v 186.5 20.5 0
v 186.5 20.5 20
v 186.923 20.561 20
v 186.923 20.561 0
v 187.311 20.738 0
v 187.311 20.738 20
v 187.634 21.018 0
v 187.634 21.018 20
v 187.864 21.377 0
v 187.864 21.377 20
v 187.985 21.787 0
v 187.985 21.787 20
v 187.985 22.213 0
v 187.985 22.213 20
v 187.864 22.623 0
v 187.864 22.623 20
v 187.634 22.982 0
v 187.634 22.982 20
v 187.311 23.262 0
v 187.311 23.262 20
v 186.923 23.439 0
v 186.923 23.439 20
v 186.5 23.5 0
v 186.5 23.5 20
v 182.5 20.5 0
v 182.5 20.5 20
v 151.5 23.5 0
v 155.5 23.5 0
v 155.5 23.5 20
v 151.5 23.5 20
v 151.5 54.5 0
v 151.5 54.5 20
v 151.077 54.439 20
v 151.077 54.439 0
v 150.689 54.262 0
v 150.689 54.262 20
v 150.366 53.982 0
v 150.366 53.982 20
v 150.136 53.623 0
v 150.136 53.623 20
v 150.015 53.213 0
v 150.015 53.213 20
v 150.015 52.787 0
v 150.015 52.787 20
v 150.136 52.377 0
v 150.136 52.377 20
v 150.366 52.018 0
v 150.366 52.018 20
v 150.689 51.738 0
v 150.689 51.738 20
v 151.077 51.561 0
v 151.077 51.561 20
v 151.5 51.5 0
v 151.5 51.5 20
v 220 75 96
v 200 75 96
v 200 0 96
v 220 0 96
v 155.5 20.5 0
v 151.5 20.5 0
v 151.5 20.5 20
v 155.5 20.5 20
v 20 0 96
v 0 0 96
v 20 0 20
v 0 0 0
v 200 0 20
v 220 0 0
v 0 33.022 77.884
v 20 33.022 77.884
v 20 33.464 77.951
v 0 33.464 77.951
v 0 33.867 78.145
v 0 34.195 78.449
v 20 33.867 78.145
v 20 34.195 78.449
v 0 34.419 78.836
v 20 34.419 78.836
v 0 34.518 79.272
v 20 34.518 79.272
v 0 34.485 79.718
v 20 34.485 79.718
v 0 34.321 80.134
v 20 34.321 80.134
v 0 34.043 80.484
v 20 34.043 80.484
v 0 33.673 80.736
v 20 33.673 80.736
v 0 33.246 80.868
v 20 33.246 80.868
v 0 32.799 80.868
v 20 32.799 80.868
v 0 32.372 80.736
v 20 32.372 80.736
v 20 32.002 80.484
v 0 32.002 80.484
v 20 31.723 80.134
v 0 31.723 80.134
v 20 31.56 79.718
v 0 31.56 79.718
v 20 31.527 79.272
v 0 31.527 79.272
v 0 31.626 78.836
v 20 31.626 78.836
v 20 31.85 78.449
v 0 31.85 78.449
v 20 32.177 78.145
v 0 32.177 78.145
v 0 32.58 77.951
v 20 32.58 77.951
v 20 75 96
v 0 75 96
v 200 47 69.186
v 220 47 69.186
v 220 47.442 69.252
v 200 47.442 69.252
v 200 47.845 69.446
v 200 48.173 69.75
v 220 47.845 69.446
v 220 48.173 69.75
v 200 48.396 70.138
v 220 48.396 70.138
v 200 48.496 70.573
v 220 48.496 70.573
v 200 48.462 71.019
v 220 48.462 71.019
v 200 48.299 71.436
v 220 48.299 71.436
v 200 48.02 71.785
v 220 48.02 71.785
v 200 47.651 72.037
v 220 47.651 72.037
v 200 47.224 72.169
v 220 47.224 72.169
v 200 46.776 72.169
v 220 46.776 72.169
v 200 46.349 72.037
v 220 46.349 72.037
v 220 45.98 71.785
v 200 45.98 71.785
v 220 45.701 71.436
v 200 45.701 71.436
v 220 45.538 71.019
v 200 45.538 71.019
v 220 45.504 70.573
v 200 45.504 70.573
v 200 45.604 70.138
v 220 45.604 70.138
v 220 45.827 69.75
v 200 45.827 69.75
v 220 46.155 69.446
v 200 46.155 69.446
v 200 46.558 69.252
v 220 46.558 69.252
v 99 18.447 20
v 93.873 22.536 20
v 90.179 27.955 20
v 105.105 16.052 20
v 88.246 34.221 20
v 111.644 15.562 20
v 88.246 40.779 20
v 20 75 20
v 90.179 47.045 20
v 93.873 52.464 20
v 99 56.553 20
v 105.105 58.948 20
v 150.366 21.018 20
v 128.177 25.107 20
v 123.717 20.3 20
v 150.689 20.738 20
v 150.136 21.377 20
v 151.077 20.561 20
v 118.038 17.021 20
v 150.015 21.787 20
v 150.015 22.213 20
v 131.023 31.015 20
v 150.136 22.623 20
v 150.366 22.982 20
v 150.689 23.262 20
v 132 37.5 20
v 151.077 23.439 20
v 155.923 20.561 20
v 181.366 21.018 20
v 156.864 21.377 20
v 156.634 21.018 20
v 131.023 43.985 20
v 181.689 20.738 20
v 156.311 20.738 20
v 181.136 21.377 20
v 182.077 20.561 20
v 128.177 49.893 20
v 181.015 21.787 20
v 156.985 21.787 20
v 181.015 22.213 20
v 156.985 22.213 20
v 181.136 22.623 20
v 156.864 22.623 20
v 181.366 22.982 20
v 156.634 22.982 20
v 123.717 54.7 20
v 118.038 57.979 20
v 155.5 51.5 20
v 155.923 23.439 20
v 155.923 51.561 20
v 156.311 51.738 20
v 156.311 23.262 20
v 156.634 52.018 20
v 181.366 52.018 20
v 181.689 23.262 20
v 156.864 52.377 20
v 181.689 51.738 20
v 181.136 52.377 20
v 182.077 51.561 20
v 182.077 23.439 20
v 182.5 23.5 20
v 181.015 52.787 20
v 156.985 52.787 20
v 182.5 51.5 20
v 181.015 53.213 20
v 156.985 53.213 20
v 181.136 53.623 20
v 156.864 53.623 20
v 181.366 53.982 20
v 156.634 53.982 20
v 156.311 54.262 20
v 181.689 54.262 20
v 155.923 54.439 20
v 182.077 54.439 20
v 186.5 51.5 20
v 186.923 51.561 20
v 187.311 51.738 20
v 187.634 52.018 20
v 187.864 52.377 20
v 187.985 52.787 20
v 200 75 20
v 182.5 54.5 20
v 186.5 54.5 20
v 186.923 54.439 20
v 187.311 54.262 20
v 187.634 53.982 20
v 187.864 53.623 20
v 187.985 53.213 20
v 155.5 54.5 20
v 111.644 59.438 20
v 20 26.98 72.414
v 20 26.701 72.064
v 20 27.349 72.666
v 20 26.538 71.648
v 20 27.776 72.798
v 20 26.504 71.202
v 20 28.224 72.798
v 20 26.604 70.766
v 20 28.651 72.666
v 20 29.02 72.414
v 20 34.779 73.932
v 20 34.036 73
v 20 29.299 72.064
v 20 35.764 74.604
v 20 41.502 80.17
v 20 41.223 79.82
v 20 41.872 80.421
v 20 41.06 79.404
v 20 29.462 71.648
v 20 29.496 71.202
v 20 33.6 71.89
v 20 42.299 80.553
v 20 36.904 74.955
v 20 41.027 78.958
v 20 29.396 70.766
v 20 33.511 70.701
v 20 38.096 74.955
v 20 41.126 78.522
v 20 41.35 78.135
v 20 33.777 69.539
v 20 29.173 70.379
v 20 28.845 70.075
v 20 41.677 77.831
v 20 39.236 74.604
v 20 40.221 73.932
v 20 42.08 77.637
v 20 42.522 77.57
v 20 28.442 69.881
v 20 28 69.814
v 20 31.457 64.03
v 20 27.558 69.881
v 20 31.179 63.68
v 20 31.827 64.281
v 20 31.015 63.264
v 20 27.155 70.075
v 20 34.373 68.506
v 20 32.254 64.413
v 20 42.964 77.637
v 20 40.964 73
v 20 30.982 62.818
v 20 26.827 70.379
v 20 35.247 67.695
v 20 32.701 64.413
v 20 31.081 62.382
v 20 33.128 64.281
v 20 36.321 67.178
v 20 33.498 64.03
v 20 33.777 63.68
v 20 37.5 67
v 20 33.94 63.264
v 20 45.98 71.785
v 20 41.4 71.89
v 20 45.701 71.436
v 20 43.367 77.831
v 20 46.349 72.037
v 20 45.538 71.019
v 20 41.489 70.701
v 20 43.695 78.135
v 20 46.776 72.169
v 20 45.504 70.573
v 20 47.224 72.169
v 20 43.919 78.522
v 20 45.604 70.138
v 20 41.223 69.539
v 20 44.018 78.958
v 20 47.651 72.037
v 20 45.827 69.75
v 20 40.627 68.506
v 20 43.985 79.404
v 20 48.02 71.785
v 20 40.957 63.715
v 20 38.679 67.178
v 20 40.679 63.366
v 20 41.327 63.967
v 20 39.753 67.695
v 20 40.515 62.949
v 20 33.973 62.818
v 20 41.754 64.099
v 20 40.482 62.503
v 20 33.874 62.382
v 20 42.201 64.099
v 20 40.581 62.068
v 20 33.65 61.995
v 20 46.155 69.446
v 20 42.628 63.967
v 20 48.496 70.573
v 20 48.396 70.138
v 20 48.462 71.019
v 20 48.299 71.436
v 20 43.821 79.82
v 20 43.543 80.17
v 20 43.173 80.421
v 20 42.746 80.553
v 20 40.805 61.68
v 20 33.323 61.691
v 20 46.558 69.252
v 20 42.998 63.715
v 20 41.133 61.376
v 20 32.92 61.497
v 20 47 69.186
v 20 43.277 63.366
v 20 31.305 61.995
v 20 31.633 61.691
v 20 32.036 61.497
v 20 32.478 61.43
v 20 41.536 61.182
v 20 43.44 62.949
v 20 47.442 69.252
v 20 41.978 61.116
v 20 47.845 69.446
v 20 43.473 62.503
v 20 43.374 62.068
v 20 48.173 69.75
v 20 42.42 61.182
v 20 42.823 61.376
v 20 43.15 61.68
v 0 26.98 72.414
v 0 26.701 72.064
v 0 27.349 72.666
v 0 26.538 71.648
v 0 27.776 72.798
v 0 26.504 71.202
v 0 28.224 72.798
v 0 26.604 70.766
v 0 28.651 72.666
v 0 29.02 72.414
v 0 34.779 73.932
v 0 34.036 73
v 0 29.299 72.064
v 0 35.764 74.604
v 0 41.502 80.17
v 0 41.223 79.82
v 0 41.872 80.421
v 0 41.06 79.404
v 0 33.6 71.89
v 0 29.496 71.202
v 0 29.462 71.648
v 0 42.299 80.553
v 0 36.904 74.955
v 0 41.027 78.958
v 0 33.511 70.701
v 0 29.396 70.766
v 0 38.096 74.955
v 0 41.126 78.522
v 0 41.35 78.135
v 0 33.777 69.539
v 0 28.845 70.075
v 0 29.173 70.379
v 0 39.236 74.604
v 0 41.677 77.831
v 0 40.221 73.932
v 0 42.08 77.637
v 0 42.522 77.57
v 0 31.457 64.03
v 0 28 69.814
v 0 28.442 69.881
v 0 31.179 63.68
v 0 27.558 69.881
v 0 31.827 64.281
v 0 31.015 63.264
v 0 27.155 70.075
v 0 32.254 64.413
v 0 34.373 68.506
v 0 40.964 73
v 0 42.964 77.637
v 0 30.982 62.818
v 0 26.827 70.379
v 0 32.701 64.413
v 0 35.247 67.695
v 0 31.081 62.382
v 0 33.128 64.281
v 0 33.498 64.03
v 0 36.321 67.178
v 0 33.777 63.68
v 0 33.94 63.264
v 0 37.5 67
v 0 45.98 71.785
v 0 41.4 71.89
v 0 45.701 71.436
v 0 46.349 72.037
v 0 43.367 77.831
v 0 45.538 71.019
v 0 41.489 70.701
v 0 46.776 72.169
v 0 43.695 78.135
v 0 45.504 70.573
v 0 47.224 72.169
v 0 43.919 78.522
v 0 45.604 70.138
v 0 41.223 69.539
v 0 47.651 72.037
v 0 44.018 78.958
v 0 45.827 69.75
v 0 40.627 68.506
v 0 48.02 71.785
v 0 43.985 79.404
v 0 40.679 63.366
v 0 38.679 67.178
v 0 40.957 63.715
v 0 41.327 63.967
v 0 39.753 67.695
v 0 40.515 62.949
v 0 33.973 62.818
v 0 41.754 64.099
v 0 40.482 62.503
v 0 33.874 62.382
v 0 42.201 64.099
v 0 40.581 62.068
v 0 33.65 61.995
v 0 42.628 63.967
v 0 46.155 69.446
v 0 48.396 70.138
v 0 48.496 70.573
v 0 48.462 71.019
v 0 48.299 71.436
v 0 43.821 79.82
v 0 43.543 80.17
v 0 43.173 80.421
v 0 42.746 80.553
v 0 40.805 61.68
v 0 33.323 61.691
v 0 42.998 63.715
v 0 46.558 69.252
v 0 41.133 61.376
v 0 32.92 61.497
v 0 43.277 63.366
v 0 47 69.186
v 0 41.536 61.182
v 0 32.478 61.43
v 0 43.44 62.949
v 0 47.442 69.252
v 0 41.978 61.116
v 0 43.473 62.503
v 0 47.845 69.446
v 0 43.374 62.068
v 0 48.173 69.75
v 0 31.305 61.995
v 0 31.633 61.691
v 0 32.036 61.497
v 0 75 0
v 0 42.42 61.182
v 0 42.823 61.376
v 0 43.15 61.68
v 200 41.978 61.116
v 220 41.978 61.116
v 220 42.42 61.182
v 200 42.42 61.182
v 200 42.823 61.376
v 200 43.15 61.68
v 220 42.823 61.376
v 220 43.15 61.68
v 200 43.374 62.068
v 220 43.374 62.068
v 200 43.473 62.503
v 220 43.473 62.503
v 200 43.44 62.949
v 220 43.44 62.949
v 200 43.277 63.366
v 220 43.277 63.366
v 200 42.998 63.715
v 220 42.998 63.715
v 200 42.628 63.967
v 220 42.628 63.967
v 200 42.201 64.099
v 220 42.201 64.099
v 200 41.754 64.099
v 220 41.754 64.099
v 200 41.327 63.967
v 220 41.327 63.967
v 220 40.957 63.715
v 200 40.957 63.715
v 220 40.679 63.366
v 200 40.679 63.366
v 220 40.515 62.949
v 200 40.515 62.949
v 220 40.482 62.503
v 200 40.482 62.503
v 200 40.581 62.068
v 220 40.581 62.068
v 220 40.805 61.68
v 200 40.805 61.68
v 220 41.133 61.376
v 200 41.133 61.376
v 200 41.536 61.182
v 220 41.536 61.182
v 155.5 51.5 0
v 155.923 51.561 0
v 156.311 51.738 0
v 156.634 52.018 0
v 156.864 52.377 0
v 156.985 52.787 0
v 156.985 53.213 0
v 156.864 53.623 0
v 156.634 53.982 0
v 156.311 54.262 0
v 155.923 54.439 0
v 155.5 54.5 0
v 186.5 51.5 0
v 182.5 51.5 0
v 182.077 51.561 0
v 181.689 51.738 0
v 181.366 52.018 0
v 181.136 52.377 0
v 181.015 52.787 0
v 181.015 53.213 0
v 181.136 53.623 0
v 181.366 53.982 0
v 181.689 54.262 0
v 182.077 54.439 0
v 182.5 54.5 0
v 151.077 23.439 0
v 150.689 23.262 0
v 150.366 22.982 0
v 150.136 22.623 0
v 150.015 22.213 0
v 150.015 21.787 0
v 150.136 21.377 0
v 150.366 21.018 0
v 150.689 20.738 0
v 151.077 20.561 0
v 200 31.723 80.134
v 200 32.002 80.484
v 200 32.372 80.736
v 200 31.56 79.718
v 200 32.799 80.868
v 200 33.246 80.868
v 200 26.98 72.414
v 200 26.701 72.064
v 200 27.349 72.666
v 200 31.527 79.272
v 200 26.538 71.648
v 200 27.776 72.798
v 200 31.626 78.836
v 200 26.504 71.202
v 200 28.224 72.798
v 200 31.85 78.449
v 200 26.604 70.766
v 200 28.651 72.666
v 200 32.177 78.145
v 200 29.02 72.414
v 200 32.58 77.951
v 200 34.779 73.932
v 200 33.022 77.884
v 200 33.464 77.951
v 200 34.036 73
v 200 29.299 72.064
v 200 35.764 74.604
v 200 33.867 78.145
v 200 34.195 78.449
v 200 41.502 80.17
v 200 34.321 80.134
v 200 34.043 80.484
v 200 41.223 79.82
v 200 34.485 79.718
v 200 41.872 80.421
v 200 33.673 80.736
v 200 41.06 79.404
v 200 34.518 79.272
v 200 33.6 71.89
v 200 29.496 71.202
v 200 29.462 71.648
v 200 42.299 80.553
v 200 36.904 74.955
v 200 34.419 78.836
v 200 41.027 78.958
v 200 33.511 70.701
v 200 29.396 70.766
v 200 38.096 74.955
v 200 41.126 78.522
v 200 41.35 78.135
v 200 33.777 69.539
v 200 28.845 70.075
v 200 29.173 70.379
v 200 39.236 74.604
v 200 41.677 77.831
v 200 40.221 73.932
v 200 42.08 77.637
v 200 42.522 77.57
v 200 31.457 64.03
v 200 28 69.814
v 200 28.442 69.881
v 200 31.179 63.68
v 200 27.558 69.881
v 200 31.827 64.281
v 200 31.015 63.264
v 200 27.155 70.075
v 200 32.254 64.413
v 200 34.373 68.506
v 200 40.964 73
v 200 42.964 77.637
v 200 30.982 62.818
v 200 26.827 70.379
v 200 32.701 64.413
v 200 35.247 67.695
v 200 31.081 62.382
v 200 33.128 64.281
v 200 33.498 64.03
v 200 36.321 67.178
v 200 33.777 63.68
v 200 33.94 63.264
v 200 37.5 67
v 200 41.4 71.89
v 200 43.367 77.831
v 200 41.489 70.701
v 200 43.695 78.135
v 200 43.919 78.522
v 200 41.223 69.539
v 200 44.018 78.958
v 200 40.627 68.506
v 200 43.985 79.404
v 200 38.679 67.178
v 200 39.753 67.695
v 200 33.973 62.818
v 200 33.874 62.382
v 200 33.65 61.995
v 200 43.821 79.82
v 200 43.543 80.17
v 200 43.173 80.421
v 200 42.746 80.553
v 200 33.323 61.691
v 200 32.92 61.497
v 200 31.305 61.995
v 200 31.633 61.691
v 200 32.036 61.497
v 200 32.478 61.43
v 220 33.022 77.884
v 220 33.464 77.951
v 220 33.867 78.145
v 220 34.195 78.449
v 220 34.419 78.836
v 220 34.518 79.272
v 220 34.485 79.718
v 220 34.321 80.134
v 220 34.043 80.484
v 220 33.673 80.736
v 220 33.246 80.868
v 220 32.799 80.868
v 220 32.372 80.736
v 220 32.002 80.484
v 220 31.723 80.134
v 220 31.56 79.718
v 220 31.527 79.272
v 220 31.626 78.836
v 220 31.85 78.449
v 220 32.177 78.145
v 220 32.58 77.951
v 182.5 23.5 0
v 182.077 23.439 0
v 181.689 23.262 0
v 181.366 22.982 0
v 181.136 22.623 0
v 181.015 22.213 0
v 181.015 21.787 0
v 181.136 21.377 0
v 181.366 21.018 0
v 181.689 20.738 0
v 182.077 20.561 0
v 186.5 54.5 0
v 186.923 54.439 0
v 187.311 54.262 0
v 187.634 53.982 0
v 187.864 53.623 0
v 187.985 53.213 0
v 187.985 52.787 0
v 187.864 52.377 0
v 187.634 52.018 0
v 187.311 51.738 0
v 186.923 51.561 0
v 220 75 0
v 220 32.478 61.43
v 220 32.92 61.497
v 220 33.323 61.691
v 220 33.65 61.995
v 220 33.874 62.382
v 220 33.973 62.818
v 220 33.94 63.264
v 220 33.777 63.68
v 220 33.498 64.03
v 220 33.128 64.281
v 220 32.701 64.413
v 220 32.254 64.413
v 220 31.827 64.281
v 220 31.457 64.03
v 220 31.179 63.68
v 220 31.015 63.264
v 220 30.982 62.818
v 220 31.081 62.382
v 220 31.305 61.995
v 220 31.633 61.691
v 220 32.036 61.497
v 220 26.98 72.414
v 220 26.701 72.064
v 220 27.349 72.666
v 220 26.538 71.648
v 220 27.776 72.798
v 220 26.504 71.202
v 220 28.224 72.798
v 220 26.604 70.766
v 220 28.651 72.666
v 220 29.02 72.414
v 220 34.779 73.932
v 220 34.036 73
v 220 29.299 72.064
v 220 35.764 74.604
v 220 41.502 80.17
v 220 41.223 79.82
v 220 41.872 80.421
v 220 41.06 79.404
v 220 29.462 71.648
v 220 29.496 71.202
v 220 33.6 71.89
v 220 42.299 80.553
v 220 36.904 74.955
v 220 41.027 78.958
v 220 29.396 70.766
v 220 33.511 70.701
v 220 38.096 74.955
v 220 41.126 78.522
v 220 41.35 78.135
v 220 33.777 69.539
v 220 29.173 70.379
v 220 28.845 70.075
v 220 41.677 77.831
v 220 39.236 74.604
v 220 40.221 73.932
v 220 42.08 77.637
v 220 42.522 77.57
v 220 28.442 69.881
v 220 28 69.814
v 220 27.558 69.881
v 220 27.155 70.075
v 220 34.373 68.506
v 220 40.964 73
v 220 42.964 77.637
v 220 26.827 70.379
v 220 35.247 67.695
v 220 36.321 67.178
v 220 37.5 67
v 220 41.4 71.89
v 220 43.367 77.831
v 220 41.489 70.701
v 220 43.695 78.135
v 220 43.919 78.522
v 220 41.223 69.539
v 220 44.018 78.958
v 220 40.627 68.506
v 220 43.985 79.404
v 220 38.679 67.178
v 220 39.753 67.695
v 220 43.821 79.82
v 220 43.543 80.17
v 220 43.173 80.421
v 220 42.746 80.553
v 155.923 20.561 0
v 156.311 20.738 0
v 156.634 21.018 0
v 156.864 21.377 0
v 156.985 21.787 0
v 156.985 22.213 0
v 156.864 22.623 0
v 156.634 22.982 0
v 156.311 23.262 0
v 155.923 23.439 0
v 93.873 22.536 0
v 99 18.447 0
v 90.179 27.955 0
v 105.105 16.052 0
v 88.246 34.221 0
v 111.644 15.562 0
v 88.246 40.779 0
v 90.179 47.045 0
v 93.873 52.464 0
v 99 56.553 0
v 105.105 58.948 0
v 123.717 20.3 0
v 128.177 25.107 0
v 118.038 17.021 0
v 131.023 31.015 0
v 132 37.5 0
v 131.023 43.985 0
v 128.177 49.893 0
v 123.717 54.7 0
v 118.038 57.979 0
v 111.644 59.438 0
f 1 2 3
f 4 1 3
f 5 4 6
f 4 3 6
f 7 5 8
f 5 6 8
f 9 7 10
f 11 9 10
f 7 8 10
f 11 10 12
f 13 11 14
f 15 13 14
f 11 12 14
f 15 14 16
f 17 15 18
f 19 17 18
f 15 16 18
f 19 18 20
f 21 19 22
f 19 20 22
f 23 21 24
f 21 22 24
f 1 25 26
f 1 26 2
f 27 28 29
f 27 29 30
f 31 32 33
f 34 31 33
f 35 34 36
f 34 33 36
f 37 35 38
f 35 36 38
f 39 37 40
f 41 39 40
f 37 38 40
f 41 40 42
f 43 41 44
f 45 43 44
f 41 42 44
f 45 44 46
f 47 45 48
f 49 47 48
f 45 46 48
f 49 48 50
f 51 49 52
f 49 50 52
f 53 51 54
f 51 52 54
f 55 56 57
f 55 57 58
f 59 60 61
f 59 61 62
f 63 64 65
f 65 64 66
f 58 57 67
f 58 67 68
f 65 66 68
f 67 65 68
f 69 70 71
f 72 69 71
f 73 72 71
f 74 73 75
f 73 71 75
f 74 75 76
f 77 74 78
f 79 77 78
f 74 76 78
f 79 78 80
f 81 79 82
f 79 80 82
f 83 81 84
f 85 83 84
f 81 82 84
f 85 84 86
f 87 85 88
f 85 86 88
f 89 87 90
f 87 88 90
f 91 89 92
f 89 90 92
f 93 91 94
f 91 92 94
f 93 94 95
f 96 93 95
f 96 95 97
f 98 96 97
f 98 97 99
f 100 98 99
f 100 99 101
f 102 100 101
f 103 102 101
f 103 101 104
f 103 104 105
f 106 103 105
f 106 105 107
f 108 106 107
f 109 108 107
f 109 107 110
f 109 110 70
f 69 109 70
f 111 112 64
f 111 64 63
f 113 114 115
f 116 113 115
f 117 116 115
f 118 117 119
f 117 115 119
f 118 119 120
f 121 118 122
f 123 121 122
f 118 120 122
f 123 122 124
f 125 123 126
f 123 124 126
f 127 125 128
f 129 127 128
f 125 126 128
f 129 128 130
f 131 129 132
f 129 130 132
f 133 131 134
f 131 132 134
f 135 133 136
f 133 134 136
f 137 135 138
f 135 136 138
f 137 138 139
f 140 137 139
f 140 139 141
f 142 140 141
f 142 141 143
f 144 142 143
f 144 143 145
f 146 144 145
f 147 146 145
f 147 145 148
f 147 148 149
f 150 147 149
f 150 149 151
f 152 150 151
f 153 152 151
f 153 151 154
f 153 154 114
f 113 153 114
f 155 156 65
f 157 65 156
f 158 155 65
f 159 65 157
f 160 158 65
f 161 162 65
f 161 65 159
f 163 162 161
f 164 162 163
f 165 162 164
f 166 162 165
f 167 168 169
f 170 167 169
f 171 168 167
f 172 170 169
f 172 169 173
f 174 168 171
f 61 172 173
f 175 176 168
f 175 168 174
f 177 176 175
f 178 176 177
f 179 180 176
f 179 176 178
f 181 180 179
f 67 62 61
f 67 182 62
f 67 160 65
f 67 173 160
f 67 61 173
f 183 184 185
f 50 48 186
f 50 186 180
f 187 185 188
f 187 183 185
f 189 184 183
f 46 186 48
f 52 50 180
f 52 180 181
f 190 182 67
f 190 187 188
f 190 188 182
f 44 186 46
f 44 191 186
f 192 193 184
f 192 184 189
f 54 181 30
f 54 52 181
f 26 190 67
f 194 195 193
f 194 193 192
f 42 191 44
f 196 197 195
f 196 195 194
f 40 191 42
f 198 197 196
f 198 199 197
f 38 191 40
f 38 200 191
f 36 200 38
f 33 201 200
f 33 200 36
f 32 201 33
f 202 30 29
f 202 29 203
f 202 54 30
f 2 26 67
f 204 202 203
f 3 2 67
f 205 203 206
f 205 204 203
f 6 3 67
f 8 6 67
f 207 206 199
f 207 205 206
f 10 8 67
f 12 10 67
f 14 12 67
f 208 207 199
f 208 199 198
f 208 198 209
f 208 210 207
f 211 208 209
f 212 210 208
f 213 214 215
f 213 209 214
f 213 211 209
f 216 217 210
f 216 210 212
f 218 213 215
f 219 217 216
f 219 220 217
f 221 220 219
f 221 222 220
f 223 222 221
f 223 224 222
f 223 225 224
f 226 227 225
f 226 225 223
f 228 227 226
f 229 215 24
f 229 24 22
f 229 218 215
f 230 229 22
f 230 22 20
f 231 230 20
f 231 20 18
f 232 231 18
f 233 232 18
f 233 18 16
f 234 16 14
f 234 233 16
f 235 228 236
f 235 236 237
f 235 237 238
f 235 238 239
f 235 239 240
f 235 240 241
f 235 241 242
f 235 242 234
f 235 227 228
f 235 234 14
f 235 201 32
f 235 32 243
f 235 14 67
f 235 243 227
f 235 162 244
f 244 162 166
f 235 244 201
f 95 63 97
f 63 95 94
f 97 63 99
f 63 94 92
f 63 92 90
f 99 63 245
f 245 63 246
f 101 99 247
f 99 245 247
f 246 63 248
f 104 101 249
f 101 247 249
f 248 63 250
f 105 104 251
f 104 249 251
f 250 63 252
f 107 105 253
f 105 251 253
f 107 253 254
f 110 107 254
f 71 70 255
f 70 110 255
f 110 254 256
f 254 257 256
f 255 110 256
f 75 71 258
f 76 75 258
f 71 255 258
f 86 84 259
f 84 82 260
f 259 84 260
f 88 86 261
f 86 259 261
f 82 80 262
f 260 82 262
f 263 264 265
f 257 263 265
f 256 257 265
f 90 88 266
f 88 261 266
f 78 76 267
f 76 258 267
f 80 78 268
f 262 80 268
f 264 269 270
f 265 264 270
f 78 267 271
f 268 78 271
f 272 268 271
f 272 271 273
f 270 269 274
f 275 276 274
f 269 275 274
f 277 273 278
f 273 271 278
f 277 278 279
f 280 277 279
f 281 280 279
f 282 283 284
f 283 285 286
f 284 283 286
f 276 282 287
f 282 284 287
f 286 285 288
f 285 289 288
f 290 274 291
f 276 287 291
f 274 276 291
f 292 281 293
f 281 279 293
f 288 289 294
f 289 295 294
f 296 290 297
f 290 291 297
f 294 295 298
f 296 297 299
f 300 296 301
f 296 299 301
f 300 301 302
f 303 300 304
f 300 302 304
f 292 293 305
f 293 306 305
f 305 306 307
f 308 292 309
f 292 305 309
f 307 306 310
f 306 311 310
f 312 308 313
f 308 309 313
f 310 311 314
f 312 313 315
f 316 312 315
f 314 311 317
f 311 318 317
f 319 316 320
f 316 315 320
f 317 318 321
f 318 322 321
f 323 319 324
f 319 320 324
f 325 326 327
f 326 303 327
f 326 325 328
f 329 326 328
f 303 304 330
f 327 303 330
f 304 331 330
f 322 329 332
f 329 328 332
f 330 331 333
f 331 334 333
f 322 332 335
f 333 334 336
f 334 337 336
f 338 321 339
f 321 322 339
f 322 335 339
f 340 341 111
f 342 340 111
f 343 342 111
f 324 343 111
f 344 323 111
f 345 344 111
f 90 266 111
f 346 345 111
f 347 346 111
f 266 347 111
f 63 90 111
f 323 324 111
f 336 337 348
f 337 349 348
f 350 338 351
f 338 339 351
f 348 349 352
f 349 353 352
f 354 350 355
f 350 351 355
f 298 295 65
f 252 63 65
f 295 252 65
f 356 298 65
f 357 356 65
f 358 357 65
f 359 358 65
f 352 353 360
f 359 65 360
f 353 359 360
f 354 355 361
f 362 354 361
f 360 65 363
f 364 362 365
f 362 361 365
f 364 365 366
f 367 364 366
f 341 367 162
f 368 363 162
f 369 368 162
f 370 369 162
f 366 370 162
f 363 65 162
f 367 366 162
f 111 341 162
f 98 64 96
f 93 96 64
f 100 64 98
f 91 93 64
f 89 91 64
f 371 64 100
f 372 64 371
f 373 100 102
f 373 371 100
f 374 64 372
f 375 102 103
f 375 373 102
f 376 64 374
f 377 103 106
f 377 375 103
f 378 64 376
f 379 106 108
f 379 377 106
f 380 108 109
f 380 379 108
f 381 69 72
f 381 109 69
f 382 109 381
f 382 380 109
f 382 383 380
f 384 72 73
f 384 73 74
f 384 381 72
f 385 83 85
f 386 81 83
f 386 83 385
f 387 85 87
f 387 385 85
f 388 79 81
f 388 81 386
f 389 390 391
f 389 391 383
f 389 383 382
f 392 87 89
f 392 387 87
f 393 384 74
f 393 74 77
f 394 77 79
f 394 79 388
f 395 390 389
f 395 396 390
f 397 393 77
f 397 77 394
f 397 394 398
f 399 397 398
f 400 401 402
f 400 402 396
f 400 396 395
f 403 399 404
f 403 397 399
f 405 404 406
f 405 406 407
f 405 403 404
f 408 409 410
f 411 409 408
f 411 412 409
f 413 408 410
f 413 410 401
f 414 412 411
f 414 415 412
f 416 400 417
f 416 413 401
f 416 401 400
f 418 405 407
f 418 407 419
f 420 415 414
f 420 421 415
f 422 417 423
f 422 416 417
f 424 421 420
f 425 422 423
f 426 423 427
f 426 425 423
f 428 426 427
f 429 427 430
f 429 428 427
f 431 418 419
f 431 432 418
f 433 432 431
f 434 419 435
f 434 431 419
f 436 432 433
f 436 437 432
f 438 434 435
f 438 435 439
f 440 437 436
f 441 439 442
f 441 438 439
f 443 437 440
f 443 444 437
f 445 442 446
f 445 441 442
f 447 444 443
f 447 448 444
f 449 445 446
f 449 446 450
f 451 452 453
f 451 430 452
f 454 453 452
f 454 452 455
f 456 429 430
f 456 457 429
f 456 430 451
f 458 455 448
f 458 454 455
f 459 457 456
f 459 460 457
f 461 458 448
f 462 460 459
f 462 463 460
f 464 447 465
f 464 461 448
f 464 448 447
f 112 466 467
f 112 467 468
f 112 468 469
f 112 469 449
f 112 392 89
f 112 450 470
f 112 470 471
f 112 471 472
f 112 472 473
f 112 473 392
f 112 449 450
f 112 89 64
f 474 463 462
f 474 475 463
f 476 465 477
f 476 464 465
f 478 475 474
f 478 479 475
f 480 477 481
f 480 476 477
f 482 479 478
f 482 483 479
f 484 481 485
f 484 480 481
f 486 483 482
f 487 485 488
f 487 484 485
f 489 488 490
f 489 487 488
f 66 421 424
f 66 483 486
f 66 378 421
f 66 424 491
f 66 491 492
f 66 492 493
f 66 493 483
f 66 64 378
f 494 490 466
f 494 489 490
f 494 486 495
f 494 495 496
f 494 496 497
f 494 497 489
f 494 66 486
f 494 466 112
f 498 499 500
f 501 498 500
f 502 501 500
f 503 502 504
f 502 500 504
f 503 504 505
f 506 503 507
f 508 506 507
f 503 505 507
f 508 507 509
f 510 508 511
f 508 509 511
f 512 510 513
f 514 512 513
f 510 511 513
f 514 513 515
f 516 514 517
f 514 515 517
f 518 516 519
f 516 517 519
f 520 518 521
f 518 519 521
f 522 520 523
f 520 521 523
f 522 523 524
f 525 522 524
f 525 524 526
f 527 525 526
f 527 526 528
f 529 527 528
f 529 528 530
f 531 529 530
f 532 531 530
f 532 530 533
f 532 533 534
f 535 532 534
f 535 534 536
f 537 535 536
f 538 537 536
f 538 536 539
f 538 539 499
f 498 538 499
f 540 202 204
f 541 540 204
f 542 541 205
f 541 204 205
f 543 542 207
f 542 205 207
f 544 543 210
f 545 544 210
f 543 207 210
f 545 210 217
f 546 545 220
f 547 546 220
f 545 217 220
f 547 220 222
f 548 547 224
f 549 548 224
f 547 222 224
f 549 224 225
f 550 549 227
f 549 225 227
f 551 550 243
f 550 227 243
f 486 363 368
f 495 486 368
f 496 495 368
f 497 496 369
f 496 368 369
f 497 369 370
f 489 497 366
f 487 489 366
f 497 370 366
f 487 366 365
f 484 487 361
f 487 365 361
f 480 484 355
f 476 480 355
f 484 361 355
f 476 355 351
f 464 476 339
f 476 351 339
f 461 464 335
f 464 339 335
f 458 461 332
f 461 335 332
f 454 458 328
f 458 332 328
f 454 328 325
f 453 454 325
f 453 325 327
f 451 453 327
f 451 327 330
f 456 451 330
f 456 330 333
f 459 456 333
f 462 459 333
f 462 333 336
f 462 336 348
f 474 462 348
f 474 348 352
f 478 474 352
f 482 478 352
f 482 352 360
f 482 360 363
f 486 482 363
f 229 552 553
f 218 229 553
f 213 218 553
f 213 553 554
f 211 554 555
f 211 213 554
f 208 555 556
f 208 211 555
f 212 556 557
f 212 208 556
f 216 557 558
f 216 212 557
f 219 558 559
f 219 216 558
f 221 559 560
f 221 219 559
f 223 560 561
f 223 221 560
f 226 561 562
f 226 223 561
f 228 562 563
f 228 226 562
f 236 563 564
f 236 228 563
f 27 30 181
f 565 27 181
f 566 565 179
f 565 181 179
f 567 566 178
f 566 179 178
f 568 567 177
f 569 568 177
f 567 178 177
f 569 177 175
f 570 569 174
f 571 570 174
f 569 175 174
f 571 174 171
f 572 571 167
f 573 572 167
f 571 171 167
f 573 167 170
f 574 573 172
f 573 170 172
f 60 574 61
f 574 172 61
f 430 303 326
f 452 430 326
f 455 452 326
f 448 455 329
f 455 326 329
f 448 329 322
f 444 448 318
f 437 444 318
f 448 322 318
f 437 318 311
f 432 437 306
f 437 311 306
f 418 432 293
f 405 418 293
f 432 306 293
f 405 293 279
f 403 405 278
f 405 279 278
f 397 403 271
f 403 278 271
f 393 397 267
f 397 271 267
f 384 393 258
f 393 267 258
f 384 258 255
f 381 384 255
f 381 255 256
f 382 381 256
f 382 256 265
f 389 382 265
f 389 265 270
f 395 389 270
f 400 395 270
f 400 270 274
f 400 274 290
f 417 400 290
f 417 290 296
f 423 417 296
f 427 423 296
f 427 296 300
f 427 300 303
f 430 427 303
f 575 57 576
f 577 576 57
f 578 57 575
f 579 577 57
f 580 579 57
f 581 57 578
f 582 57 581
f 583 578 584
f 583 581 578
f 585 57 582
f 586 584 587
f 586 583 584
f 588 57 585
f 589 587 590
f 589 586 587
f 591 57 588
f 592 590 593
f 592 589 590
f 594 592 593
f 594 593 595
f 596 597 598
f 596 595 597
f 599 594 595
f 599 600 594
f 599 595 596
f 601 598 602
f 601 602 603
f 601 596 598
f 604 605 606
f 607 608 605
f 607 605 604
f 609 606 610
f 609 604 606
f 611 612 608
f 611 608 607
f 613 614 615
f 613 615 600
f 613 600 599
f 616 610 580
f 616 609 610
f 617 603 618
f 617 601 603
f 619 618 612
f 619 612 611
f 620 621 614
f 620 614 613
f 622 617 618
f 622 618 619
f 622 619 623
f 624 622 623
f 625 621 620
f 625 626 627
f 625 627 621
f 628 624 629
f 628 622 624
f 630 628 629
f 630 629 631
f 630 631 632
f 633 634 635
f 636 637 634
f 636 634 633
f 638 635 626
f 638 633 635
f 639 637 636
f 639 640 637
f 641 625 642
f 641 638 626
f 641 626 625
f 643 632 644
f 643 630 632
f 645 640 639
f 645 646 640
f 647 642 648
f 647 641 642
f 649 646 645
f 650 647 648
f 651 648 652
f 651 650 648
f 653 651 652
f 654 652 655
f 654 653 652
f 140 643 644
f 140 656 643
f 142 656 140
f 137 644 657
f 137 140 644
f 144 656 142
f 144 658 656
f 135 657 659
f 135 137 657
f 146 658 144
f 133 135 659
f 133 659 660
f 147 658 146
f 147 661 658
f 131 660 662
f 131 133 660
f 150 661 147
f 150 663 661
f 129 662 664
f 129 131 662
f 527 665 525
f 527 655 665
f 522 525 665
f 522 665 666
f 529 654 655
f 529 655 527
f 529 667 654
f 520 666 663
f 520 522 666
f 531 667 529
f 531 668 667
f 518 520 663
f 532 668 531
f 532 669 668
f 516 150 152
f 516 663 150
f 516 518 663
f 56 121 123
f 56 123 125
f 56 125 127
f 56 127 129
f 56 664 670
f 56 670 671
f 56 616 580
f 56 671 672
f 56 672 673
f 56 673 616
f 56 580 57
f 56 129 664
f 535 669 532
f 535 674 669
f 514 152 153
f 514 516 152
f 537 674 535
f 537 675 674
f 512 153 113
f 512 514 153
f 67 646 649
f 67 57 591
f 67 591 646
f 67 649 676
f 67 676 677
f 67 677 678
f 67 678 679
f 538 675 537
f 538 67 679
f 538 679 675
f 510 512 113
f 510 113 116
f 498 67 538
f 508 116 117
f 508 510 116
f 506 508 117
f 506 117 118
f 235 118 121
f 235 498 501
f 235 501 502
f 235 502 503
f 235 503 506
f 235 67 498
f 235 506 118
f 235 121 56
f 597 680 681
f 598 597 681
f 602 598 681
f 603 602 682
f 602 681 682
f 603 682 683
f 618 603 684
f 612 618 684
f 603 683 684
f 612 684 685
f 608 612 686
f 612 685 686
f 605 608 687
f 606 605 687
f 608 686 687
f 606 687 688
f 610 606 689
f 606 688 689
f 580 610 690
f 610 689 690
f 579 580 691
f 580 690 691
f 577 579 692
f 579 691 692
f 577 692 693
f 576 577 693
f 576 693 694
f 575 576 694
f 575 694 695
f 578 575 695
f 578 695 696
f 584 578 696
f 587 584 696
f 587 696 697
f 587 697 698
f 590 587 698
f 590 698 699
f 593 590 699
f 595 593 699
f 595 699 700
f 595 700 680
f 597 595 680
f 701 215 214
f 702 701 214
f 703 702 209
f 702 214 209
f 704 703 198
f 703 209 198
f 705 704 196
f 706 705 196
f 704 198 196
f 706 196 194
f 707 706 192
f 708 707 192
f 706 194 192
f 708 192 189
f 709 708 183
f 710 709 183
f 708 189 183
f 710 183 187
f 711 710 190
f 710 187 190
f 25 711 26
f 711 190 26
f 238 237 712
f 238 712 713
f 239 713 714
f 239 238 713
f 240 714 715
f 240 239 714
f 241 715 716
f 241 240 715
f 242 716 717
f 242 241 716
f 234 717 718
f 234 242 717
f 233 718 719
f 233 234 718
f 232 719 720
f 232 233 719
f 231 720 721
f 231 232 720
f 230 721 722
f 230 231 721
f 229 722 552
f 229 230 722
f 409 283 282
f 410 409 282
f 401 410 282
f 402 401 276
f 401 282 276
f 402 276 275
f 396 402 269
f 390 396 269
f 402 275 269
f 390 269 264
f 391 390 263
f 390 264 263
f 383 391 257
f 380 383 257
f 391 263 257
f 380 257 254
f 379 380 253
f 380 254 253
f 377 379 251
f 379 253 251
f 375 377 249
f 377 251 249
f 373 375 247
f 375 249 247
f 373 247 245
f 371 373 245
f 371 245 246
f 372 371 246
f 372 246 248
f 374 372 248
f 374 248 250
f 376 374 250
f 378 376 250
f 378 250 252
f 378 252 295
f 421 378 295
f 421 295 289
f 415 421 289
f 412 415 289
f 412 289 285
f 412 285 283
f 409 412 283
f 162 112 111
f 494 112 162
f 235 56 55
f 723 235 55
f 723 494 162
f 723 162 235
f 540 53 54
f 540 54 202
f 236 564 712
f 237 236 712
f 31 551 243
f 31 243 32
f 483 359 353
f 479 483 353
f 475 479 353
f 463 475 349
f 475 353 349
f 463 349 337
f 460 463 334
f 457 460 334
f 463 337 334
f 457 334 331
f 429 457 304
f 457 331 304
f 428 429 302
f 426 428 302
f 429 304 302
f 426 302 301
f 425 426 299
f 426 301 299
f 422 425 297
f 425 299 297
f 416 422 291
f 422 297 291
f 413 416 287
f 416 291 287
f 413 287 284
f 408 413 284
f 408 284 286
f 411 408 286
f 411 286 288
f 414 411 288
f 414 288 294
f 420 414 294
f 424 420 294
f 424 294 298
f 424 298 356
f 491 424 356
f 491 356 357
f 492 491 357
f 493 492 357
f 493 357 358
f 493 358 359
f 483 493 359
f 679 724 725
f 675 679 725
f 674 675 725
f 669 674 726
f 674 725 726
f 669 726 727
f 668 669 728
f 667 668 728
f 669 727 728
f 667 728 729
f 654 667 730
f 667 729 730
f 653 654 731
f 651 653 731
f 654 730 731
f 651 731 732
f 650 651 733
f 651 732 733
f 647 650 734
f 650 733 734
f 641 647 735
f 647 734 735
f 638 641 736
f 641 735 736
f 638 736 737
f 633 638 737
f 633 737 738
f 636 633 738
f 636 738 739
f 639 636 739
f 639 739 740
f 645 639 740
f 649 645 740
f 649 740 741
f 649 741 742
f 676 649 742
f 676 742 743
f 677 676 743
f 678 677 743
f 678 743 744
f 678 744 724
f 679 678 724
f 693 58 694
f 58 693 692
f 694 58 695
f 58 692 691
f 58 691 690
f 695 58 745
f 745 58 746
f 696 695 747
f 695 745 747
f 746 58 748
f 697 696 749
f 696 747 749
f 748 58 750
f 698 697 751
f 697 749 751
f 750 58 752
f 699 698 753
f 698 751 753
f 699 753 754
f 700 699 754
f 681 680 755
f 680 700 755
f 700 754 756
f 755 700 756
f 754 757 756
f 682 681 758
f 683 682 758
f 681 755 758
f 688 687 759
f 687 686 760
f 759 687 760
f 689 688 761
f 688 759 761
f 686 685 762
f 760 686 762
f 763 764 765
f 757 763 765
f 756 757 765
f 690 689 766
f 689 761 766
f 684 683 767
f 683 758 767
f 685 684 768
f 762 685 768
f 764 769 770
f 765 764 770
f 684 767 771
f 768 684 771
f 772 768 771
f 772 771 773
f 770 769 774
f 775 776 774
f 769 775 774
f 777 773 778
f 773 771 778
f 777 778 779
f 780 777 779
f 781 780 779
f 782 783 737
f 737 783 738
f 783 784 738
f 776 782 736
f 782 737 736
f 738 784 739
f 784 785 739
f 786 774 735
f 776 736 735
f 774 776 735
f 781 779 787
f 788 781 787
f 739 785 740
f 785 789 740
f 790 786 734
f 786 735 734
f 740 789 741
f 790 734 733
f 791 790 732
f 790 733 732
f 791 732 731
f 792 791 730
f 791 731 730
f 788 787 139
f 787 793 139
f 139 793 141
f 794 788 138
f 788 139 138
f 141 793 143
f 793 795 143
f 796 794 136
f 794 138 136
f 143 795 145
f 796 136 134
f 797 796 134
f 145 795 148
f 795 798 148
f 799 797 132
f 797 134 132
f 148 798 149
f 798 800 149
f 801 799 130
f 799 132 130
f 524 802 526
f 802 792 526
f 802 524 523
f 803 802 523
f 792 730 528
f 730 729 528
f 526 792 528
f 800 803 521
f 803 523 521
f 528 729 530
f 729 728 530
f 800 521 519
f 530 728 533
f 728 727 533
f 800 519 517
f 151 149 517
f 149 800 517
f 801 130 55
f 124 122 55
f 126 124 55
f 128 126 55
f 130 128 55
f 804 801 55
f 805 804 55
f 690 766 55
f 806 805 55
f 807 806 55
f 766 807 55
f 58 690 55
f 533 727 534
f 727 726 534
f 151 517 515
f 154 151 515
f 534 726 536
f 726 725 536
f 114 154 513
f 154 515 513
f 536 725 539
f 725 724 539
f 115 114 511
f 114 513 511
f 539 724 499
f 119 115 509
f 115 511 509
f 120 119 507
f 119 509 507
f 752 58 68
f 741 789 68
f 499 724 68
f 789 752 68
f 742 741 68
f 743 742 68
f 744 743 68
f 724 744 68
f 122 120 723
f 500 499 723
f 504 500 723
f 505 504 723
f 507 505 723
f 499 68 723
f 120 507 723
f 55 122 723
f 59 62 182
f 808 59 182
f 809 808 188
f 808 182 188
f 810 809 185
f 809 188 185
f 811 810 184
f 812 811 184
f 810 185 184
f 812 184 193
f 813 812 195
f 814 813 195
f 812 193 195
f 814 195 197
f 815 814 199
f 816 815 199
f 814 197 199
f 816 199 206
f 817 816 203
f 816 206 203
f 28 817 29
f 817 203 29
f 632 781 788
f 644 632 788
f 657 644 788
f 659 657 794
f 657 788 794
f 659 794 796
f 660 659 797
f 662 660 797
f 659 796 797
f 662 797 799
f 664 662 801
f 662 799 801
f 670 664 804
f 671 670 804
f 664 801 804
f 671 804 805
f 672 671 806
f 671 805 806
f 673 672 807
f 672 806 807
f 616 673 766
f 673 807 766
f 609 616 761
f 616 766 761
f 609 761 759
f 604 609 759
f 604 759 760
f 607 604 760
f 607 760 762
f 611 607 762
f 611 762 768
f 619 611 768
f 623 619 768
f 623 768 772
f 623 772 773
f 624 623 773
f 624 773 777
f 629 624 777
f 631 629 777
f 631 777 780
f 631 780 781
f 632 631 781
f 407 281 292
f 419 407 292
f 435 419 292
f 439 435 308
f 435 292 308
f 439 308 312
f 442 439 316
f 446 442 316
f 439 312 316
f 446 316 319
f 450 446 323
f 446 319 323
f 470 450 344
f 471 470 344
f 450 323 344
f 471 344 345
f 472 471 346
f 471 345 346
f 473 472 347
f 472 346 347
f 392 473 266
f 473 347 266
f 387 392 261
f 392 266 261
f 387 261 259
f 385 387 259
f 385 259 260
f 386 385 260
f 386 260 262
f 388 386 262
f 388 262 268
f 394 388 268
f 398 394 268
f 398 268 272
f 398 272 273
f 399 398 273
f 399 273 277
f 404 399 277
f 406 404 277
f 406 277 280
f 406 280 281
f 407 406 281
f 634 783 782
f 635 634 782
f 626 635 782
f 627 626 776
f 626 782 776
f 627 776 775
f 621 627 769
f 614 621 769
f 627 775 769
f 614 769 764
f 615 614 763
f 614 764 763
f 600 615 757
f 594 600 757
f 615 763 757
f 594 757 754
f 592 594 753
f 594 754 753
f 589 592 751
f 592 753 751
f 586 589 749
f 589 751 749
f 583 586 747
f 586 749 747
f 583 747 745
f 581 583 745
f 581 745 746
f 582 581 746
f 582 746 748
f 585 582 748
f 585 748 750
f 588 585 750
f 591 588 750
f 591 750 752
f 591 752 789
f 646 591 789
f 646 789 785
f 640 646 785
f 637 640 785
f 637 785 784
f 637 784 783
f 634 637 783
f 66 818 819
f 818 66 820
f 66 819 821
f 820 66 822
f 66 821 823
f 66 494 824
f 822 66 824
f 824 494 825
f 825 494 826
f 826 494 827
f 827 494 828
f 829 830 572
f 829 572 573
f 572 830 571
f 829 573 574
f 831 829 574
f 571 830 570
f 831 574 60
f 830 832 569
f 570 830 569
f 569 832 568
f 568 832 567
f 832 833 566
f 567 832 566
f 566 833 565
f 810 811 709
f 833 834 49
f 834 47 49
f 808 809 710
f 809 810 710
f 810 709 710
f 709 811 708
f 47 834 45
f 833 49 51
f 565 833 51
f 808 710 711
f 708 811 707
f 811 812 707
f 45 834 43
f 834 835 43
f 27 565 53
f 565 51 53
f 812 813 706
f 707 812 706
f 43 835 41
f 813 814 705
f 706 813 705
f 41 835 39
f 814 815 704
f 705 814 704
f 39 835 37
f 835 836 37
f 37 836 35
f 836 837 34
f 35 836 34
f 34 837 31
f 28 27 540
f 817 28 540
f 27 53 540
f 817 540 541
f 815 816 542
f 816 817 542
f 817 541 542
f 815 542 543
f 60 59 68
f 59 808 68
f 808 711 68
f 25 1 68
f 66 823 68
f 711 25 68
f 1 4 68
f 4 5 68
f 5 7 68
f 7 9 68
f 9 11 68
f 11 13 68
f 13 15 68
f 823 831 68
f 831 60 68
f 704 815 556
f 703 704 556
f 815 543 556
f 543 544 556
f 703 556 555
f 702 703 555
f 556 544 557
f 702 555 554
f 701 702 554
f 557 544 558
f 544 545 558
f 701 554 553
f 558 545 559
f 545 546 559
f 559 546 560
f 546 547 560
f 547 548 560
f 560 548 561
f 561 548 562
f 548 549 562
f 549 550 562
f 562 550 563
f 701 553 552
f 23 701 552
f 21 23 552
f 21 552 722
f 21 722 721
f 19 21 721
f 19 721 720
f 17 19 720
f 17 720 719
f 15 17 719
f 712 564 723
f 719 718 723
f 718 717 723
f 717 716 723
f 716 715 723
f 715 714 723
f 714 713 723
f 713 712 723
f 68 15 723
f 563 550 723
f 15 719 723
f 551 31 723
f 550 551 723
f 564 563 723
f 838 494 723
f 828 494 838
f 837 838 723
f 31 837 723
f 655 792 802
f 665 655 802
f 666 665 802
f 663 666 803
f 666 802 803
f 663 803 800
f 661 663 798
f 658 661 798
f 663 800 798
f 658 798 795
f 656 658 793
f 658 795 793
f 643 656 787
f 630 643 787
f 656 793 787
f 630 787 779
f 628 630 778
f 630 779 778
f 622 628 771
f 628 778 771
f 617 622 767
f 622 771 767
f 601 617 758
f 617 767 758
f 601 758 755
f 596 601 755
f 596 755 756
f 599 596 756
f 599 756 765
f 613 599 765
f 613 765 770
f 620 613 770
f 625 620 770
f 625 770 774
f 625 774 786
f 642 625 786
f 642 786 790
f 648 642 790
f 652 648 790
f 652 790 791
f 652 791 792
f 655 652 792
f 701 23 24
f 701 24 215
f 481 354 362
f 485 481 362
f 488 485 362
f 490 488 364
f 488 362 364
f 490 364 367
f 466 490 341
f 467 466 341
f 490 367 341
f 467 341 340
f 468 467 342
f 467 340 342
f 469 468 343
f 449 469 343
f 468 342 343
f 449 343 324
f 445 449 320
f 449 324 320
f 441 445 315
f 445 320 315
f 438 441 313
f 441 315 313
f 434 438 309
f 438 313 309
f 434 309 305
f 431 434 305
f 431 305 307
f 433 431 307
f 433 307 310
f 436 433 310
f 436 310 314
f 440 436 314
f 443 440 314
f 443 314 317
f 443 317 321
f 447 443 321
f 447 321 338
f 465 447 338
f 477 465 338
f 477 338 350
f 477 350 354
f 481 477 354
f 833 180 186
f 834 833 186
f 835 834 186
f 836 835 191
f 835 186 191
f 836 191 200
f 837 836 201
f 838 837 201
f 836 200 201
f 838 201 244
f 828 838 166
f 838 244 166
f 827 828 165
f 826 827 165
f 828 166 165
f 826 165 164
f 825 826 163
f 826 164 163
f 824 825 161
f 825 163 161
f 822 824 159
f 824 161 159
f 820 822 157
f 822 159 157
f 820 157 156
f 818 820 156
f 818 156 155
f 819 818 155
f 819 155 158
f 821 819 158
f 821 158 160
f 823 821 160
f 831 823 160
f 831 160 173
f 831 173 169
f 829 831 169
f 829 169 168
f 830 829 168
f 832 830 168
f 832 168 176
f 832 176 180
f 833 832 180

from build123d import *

# Parameters (mm, degrees)
ESQUISSE1_W             = 220
ESQUISSE1_H             = 75
BOSS_EXTRU_1_DEPTH      = 20
ESQUISSE2_W             = 20
ESQUISSE2_H             = 75
BOSS_EXTRU_2_DEPTH      = 76
ESQUISSE3_R             = 4
ENL_V_MAT_EXTRU_1_DEPTH = 252.4776332
ESQUISSE4_R             = 22
ENL_V_MAT_EXTRU_2_DEPTH = 76
ESQUISSE5_R             = 1.5
ENL_V_MAT_EXTRU_3_DEPTH = 252.4776332
ENL_V_MAT_EXTRU_5_DEPTH = 245.542429856


with BuildPart() as part:
    # Esquisse1 → Boss.-Extru.1 (new body)
    with BuildSketch(Plane.XY):
        with Locations((110, 37.5)):
            Rectangle(ESQUISSE1_W, ESQUISSE1_H)
    extrude(amount=BOSS_EXTRU_1_DEPTH)

    # Esquisse2 → Boss.-Extru.2 (add)
    with BuildSketch(Plane.XY.offset(20)):
        with Locations((210, 37.5)):
            Rectangle(ESQUISSE2_W, ESQUISSE2_H)
        with Locations((10, 37.5)):
            Rectangle(ESQUISSE2_W, ESQUISSE2_H)
    extrude(amount=BOSS_EXTRU_2_DEPTH)

    # Esquisse3 → Enlèv. mat.-Extru.1 (cut, through all)
    with BuildSketch(Plane(origin=(220, 0, 0), x_dir=(0, 0, -1), z_dir=(1, 0, 0))):
        with Locations((-71, 37.5)):
            Circle(ESQUISSE3_R)
    extrude(amount=-ENL_V_MAT_EXTRU_1_DEPTH, mode=Mode.SUBTRACT)

    # Esquisse4 → Enlèv. mat.-Extru.2 (cut)
    with BuildSketch(Plane.XY.offset(20)):
        with Locations((110, 37.5)):
            Circle(ESQUISSE4_R)
    extrude(amount=-ENL_V_MAT_EXTRU_2_DEPTH, mode=Mode.SUBTRACT)

    # Esquisse5 → Enlèv. mat.-Extru.3 (cut, through all)
    with BuildSketch(Plane(origin=(220, 0, 0), x_dir=(0, 0, -1), z_dir=(1, 0, 0))):
        with Locations((-70.685514893, 47)):
            Circle(ESQUISSE5_R)
        with Locations((-62.61551611, 41.977647908)):
            Circle(ESQUISSE5_R)
        with Locations((-62.930001218, 32.477647908)):
            Circle(ESQUISSE5_R)
        with Locations((-71.314485107, 28)):
            Circle(ESQUISSE5_R)
        with Locations((-79.38448389, 33.022352092)):
            Circle(ESQUISSE5_R)
        with Locations((-79.069998782, 42.522352092)):
            Circle(ESQUISSE5_R)
    extrude(amount=-ENL_V_MAT_EXTRU_3_DEPTH, mode=Mode.SUBTRACT)

    # Esquisse6 → Enlèv. mat.-Extru.5 (cut, through all)
    with BuildSketch(Plane.XY.offset(20)):
        with BuildLine():
            Line((182.5, 54.5), (186.5, 54.5))
            ThreePointArc((186.5, 54.5), (188, 53), (186.5, 51.5))
            Line((186.5, 51.5), (182.5, 51.5))
            ThreePointArc((182.5, 51.5), (181, 53), (182.5, 54.5))
        make_face()
        with BuildLine():
            Line((151.5, 51.5), (155.5, 51.5))
            ThreePointArc((155.5, 51.5), (157, 53), (155.5, 54.5))
            Line((155.5, 54.5), (151.5, 54.5))
            ThreePointArc((151.5, 54.5), (150, 53), (151.5, 51.5))
        make_face()
        with BuildLine():
            Line((151.5, 20.5), (155.5, 20.5))
            ThreePointArc((155.5, 20.5), (157, 22), (155.5, 23.5))
            Line((155.5, 23.5), (151.5, 23.5))
            ThreePointArc((151.5, 23.5), (150, 22), (151.5, 20.5))
        make_face()
        with BuildLine():
            Line((182.5, 20.5), (186.5, 20.5))
            ThreePointArc((186.5, 20.5), (188, 22), (186.5, 23.5))
            Line((186.5, 23.5), (182.5, 23.5))
            ThreePointArc((182.5, 23.5), (181, 22), (182.5, 20.5))
        make_face()
    extrude(amount=-ENL_V_MAT_EXTRU_5_DEPTH, mode=Mode.SUBTRACT)


solid = part.part
